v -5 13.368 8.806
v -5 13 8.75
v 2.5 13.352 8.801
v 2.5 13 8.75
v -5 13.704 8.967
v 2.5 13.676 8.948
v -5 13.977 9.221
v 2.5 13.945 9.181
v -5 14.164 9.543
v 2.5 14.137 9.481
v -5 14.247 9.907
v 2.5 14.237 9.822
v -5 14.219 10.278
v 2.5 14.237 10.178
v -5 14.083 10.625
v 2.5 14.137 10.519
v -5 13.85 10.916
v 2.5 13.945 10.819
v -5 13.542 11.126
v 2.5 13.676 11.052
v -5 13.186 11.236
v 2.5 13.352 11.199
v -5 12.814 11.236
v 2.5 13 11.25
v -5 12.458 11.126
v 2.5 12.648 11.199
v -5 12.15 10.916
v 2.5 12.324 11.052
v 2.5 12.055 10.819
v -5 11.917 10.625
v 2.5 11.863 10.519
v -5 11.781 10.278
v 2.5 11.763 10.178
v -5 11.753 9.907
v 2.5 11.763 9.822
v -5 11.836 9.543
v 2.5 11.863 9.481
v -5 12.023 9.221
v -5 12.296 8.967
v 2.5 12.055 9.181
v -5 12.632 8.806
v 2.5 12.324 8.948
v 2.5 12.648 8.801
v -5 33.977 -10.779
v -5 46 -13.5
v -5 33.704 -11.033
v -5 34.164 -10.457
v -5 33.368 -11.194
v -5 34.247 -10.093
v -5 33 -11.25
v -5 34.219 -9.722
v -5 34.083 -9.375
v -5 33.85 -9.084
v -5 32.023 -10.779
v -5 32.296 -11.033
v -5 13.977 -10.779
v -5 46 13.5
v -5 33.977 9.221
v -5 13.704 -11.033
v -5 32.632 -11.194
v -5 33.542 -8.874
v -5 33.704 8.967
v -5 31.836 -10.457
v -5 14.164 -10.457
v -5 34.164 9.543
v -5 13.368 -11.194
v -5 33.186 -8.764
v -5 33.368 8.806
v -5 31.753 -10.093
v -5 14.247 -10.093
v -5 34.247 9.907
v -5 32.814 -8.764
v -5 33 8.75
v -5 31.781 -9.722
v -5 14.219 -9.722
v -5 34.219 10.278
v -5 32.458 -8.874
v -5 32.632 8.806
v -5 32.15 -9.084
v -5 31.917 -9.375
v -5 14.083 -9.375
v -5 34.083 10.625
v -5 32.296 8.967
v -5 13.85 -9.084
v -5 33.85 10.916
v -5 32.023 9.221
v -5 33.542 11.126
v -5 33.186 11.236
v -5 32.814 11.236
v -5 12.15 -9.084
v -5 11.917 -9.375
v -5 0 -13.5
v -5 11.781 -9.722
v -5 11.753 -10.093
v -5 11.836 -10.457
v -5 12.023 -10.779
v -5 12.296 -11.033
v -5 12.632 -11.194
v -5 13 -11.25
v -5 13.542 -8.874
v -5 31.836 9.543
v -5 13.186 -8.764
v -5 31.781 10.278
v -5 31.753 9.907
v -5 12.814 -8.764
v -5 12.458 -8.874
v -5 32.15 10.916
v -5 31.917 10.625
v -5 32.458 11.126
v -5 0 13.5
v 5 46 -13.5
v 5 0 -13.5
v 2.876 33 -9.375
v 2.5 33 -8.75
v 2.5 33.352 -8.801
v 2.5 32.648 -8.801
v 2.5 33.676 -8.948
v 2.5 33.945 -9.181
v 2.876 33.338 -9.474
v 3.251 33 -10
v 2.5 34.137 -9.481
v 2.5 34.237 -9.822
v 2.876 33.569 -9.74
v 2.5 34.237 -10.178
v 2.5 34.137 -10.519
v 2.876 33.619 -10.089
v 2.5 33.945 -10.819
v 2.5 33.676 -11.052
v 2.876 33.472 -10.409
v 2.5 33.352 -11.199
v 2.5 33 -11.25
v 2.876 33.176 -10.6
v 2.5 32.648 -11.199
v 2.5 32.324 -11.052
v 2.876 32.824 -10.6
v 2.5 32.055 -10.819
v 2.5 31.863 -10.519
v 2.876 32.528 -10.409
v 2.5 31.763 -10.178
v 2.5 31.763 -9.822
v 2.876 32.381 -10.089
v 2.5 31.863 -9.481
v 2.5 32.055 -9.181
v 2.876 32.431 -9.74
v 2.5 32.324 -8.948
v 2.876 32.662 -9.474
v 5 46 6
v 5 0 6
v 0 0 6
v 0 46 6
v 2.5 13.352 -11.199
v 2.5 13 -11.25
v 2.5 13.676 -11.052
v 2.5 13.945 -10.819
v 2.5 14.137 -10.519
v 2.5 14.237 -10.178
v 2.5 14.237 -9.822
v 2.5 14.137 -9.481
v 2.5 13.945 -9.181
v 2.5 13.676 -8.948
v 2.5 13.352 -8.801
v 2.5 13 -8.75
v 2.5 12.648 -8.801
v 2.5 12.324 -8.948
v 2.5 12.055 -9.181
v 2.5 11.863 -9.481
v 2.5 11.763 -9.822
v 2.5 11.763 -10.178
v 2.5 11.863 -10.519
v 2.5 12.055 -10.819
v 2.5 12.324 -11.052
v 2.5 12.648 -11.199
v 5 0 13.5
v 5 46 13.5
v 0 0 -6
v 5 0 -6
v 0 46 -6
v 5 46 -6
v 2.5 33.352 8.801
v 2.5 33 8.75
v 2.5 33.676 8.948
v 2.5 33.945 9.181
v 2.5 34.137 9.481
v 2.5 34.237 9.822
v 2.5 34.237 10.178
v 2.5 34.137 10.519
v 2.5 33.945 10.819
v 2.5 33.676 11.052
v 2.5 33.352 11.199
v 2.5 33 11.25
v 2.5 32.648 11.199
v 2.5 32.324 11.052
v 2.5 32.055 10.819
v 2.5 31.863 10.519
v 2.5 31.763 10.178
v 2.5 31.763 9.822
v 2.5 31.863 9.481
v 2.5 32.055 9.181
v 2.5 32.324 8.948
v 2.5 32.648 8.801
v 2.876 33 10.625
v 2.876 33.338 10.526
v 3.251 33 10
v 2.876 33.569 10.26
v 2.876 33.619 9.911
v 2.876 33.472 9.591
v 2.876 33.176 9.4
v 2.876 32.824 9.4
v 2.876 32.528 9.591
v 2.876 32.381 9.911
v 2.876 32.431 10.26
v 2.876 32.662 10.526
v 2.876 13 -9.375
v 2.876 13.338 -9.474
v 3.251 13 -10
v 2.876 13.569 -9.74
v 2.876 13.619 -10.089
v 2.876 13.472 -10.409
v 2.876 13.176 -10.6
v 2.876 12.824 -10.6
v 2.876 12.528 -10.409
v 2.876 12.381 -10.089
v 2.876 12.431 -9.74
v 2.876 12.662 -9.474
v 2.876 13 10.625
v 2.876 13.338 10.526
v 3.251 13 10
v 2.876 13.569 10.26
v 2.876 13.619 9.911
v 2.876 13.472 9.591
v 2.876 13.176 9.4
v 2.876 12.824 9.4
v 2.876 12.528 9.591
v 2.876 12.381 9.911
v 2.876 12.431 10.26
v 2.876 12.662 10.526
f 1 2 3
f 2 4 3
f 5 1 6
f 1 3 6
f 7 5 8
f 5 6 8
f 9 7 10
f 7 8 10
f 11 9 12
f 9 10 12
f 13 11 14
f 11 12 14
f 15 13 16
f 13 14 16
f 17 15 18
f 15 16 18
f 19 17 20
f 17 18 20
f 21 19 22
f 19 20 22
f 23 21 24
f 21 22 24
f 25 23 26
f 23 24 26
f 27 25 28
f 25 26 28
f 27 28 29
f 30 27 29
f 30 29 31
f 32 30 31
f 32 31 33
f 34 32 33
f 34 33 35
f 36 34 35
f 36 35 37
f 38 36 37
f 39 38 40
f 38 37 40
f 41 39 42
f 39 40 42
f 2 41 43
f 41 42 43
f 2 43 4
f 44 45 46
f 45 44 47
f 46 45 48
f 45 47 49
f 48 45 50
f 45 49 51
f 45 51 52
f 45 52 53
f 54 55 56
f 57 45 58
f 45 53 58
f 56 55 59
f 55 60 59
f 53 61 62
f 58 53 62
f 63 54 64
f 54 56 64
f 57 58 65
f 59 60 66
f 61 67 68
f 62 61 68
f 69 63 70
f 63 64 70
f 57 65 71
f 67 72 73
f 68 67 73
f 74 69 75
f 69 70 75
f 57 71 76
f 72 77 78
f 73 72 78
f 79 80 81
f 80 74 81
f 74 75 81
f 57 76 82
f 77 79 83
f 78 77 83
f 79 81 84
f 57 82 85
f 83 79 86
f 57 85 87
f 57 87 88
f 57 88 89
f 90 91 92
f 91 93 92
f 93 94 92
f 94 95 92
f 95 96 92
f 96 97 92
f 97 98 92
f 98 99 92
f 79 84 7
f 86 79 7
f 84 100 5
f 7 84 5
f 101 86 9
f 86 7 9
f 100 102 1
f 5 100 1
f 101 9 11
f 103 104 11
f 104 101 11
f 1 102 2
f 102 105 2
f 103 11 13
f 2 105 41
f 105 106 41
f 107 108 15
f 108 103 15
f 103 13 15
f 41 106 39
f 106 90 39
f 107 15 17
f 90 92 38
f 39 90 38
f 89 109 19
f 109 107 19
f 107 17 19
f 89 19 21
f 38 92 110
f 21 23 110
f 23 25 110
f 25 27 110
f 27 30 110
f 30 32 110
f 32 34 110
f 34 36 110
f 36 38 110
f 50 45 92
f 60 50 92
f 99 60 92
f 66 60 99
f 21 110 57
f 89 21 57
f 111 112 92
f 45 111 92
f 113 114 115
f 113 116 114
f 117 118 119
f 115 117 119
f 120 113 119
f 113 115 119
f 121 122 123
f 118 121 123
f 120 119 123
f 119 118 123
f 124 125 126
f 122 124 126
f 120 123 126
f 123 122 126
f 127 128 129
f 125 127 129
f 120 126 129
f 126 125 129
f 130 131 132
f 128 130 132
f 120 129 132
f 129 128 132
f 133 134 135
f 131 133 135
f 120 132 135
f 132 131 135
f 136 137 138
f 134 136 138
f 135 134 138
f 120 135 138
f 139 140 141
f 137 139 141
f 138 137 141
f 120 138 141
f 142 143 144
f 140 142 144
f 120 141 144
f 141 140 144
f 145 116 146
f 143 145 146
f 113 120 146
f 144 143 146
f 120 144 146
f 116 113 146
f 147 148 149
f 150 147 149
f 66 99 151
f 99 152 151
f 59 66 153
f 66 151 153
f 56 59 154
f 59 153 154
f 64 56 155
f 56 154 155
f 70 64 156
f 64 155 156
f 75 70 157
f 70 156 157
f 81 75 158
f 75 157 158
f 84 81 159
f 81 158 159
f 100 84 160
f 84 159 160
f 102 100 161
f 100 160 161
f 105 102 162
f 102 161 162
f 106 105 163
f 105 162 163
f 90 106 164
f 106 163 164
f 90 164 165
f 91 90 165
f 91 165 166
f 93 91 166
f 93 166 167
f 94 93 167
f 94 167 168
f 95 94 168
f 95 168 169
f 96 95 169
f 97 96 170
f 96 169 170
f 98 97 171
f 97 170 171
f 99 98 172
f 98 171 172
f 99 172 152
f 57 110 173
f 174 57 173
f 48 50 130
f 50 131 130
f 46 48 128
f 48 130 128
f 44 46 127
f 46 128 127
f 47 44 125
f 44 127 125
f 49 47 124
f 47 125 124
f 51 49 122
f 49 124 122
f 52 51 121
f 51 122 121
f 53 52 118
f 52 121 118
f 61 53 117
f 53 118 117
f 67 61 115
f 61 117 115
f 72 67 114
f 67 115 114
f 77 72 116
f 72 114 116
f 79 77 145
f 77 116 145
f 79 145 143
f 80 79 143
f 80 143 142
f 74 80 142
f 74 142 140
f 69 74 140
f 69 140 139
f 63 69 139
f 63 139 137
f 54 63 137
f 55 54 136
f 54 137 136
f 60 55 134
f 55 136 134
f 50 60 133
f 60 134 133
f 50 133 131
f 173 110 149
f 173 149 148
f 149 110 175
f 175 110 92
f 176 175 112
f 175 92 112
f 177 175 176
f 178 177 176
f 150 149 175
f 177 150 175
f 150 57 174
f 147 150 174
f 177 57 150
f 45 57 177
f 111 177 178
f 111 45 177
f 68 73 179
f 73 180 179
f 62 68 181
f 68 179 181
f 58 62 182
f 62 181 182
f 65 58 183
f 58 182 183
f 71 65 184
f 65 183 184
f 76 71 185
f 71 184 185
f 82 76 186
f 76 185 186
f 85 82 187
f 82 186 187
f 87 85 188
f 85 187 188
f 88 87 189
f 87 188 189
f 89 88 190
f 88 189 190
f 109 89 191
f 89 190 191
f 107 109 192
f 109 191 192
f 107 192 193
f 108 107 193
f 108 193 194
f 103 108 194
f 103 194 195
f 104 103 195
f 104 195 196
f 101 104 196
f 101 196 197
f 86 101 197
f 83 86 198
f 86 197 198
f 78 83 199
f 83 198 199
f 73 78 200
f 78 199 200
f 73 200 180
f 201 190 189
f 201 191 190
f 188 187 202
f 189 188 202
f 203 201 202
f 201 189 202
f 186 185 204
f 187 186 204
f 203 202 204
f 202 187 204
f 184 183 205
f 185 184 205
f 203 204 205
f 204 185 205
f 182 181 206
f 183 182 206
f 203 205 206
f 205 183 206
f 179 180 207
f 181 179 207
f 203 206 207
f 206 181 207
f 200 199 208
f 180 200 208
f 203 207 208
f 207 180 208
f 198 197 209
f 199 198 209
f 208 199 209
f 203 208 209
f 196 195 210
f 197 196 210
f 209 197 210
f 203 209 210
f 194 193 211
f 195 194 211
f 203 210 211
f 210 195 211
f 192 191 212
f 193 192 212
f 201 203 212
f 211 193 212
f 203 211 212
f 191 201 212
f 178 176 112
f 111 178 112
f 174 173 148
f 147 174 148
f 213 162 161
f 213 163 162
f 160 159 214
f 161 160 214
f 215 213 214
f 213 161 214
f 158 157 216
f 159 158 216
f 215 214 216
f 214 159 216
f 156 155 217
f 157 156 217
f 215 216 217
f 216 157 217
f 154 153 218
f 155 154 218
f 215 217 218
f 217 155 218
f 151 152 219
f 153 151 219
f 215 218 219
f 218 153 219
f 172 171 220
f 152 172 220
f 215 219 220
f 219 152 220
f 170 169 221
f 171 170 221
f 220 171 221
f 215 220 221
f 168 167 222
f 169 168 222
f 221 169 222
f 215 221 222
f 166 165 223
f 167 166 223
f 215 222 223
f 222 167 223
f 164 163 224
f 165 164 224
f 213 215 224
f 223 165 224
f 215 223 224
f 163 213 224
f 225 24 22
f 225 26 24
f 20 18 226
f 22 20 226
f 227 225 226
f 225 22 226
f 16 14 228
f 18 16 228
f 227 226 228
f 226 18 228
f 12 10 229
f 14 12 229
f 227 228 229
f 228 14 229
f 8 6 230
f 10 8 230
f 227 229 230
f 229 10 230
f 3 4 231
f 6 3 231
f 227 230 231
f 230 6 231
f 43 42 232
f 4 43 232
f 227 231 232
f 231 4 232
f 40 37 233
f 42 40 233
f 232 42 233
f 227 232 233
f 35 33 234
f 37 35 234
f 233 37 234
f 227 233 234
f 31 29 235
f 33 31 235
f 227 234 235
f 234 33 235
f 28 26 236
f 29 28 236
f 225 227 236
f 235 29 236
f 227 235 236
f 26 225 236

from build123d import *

# Parameters (mm, degrees)
BOSS_EXTRUDE1_DEPTH   = 46
M3_TAPPED_HOLE1_D     = 2.5
M3_TAPPED_HOLE1_DEPTH = 7.5
M3_TAPPED_HOLE1_TIP   = 0.751075774


with BuildPart() as part:
    # Sketch1 → Boss-Extrude1 (new body)
    with BuildSketch(Plane(origin=(0, 0, 0), x_dir=(1, 0, 0), z_dir=(0, 1, 0))):
        Polygon((5, 6), (5, 13.5), (-5, 13.5), (-5, -13.5), (5, -13.5), (5, -6), (0, -6), (0, 6), align=None)
    extrude(amount=BOSS_EXTRUDE1_DEPTH)

    # M3 Tapped Hole1
    with Locations(Plane.ZY.offset(5)):
        with Locations((10, 33), (-10, 33), (-10, 13), (10, 13)):
            Hole(M3_TAPPED_HOLE1_D / 2, depth=M3_TAPPED_HOLE1_DEPTH)
            with Locations((0, 0, -(M3_TAPPED_HOLE1_DEPTH + M3_TAPPED_HOLE1_TIP / 2))):  # 118° drill point
                Cone(0, M3_TAPPED_HOLE1_D / 2, M3_TAPPED_HOLE1_TIP, mode=Mode.SUBTRACT)


solid = part.part
